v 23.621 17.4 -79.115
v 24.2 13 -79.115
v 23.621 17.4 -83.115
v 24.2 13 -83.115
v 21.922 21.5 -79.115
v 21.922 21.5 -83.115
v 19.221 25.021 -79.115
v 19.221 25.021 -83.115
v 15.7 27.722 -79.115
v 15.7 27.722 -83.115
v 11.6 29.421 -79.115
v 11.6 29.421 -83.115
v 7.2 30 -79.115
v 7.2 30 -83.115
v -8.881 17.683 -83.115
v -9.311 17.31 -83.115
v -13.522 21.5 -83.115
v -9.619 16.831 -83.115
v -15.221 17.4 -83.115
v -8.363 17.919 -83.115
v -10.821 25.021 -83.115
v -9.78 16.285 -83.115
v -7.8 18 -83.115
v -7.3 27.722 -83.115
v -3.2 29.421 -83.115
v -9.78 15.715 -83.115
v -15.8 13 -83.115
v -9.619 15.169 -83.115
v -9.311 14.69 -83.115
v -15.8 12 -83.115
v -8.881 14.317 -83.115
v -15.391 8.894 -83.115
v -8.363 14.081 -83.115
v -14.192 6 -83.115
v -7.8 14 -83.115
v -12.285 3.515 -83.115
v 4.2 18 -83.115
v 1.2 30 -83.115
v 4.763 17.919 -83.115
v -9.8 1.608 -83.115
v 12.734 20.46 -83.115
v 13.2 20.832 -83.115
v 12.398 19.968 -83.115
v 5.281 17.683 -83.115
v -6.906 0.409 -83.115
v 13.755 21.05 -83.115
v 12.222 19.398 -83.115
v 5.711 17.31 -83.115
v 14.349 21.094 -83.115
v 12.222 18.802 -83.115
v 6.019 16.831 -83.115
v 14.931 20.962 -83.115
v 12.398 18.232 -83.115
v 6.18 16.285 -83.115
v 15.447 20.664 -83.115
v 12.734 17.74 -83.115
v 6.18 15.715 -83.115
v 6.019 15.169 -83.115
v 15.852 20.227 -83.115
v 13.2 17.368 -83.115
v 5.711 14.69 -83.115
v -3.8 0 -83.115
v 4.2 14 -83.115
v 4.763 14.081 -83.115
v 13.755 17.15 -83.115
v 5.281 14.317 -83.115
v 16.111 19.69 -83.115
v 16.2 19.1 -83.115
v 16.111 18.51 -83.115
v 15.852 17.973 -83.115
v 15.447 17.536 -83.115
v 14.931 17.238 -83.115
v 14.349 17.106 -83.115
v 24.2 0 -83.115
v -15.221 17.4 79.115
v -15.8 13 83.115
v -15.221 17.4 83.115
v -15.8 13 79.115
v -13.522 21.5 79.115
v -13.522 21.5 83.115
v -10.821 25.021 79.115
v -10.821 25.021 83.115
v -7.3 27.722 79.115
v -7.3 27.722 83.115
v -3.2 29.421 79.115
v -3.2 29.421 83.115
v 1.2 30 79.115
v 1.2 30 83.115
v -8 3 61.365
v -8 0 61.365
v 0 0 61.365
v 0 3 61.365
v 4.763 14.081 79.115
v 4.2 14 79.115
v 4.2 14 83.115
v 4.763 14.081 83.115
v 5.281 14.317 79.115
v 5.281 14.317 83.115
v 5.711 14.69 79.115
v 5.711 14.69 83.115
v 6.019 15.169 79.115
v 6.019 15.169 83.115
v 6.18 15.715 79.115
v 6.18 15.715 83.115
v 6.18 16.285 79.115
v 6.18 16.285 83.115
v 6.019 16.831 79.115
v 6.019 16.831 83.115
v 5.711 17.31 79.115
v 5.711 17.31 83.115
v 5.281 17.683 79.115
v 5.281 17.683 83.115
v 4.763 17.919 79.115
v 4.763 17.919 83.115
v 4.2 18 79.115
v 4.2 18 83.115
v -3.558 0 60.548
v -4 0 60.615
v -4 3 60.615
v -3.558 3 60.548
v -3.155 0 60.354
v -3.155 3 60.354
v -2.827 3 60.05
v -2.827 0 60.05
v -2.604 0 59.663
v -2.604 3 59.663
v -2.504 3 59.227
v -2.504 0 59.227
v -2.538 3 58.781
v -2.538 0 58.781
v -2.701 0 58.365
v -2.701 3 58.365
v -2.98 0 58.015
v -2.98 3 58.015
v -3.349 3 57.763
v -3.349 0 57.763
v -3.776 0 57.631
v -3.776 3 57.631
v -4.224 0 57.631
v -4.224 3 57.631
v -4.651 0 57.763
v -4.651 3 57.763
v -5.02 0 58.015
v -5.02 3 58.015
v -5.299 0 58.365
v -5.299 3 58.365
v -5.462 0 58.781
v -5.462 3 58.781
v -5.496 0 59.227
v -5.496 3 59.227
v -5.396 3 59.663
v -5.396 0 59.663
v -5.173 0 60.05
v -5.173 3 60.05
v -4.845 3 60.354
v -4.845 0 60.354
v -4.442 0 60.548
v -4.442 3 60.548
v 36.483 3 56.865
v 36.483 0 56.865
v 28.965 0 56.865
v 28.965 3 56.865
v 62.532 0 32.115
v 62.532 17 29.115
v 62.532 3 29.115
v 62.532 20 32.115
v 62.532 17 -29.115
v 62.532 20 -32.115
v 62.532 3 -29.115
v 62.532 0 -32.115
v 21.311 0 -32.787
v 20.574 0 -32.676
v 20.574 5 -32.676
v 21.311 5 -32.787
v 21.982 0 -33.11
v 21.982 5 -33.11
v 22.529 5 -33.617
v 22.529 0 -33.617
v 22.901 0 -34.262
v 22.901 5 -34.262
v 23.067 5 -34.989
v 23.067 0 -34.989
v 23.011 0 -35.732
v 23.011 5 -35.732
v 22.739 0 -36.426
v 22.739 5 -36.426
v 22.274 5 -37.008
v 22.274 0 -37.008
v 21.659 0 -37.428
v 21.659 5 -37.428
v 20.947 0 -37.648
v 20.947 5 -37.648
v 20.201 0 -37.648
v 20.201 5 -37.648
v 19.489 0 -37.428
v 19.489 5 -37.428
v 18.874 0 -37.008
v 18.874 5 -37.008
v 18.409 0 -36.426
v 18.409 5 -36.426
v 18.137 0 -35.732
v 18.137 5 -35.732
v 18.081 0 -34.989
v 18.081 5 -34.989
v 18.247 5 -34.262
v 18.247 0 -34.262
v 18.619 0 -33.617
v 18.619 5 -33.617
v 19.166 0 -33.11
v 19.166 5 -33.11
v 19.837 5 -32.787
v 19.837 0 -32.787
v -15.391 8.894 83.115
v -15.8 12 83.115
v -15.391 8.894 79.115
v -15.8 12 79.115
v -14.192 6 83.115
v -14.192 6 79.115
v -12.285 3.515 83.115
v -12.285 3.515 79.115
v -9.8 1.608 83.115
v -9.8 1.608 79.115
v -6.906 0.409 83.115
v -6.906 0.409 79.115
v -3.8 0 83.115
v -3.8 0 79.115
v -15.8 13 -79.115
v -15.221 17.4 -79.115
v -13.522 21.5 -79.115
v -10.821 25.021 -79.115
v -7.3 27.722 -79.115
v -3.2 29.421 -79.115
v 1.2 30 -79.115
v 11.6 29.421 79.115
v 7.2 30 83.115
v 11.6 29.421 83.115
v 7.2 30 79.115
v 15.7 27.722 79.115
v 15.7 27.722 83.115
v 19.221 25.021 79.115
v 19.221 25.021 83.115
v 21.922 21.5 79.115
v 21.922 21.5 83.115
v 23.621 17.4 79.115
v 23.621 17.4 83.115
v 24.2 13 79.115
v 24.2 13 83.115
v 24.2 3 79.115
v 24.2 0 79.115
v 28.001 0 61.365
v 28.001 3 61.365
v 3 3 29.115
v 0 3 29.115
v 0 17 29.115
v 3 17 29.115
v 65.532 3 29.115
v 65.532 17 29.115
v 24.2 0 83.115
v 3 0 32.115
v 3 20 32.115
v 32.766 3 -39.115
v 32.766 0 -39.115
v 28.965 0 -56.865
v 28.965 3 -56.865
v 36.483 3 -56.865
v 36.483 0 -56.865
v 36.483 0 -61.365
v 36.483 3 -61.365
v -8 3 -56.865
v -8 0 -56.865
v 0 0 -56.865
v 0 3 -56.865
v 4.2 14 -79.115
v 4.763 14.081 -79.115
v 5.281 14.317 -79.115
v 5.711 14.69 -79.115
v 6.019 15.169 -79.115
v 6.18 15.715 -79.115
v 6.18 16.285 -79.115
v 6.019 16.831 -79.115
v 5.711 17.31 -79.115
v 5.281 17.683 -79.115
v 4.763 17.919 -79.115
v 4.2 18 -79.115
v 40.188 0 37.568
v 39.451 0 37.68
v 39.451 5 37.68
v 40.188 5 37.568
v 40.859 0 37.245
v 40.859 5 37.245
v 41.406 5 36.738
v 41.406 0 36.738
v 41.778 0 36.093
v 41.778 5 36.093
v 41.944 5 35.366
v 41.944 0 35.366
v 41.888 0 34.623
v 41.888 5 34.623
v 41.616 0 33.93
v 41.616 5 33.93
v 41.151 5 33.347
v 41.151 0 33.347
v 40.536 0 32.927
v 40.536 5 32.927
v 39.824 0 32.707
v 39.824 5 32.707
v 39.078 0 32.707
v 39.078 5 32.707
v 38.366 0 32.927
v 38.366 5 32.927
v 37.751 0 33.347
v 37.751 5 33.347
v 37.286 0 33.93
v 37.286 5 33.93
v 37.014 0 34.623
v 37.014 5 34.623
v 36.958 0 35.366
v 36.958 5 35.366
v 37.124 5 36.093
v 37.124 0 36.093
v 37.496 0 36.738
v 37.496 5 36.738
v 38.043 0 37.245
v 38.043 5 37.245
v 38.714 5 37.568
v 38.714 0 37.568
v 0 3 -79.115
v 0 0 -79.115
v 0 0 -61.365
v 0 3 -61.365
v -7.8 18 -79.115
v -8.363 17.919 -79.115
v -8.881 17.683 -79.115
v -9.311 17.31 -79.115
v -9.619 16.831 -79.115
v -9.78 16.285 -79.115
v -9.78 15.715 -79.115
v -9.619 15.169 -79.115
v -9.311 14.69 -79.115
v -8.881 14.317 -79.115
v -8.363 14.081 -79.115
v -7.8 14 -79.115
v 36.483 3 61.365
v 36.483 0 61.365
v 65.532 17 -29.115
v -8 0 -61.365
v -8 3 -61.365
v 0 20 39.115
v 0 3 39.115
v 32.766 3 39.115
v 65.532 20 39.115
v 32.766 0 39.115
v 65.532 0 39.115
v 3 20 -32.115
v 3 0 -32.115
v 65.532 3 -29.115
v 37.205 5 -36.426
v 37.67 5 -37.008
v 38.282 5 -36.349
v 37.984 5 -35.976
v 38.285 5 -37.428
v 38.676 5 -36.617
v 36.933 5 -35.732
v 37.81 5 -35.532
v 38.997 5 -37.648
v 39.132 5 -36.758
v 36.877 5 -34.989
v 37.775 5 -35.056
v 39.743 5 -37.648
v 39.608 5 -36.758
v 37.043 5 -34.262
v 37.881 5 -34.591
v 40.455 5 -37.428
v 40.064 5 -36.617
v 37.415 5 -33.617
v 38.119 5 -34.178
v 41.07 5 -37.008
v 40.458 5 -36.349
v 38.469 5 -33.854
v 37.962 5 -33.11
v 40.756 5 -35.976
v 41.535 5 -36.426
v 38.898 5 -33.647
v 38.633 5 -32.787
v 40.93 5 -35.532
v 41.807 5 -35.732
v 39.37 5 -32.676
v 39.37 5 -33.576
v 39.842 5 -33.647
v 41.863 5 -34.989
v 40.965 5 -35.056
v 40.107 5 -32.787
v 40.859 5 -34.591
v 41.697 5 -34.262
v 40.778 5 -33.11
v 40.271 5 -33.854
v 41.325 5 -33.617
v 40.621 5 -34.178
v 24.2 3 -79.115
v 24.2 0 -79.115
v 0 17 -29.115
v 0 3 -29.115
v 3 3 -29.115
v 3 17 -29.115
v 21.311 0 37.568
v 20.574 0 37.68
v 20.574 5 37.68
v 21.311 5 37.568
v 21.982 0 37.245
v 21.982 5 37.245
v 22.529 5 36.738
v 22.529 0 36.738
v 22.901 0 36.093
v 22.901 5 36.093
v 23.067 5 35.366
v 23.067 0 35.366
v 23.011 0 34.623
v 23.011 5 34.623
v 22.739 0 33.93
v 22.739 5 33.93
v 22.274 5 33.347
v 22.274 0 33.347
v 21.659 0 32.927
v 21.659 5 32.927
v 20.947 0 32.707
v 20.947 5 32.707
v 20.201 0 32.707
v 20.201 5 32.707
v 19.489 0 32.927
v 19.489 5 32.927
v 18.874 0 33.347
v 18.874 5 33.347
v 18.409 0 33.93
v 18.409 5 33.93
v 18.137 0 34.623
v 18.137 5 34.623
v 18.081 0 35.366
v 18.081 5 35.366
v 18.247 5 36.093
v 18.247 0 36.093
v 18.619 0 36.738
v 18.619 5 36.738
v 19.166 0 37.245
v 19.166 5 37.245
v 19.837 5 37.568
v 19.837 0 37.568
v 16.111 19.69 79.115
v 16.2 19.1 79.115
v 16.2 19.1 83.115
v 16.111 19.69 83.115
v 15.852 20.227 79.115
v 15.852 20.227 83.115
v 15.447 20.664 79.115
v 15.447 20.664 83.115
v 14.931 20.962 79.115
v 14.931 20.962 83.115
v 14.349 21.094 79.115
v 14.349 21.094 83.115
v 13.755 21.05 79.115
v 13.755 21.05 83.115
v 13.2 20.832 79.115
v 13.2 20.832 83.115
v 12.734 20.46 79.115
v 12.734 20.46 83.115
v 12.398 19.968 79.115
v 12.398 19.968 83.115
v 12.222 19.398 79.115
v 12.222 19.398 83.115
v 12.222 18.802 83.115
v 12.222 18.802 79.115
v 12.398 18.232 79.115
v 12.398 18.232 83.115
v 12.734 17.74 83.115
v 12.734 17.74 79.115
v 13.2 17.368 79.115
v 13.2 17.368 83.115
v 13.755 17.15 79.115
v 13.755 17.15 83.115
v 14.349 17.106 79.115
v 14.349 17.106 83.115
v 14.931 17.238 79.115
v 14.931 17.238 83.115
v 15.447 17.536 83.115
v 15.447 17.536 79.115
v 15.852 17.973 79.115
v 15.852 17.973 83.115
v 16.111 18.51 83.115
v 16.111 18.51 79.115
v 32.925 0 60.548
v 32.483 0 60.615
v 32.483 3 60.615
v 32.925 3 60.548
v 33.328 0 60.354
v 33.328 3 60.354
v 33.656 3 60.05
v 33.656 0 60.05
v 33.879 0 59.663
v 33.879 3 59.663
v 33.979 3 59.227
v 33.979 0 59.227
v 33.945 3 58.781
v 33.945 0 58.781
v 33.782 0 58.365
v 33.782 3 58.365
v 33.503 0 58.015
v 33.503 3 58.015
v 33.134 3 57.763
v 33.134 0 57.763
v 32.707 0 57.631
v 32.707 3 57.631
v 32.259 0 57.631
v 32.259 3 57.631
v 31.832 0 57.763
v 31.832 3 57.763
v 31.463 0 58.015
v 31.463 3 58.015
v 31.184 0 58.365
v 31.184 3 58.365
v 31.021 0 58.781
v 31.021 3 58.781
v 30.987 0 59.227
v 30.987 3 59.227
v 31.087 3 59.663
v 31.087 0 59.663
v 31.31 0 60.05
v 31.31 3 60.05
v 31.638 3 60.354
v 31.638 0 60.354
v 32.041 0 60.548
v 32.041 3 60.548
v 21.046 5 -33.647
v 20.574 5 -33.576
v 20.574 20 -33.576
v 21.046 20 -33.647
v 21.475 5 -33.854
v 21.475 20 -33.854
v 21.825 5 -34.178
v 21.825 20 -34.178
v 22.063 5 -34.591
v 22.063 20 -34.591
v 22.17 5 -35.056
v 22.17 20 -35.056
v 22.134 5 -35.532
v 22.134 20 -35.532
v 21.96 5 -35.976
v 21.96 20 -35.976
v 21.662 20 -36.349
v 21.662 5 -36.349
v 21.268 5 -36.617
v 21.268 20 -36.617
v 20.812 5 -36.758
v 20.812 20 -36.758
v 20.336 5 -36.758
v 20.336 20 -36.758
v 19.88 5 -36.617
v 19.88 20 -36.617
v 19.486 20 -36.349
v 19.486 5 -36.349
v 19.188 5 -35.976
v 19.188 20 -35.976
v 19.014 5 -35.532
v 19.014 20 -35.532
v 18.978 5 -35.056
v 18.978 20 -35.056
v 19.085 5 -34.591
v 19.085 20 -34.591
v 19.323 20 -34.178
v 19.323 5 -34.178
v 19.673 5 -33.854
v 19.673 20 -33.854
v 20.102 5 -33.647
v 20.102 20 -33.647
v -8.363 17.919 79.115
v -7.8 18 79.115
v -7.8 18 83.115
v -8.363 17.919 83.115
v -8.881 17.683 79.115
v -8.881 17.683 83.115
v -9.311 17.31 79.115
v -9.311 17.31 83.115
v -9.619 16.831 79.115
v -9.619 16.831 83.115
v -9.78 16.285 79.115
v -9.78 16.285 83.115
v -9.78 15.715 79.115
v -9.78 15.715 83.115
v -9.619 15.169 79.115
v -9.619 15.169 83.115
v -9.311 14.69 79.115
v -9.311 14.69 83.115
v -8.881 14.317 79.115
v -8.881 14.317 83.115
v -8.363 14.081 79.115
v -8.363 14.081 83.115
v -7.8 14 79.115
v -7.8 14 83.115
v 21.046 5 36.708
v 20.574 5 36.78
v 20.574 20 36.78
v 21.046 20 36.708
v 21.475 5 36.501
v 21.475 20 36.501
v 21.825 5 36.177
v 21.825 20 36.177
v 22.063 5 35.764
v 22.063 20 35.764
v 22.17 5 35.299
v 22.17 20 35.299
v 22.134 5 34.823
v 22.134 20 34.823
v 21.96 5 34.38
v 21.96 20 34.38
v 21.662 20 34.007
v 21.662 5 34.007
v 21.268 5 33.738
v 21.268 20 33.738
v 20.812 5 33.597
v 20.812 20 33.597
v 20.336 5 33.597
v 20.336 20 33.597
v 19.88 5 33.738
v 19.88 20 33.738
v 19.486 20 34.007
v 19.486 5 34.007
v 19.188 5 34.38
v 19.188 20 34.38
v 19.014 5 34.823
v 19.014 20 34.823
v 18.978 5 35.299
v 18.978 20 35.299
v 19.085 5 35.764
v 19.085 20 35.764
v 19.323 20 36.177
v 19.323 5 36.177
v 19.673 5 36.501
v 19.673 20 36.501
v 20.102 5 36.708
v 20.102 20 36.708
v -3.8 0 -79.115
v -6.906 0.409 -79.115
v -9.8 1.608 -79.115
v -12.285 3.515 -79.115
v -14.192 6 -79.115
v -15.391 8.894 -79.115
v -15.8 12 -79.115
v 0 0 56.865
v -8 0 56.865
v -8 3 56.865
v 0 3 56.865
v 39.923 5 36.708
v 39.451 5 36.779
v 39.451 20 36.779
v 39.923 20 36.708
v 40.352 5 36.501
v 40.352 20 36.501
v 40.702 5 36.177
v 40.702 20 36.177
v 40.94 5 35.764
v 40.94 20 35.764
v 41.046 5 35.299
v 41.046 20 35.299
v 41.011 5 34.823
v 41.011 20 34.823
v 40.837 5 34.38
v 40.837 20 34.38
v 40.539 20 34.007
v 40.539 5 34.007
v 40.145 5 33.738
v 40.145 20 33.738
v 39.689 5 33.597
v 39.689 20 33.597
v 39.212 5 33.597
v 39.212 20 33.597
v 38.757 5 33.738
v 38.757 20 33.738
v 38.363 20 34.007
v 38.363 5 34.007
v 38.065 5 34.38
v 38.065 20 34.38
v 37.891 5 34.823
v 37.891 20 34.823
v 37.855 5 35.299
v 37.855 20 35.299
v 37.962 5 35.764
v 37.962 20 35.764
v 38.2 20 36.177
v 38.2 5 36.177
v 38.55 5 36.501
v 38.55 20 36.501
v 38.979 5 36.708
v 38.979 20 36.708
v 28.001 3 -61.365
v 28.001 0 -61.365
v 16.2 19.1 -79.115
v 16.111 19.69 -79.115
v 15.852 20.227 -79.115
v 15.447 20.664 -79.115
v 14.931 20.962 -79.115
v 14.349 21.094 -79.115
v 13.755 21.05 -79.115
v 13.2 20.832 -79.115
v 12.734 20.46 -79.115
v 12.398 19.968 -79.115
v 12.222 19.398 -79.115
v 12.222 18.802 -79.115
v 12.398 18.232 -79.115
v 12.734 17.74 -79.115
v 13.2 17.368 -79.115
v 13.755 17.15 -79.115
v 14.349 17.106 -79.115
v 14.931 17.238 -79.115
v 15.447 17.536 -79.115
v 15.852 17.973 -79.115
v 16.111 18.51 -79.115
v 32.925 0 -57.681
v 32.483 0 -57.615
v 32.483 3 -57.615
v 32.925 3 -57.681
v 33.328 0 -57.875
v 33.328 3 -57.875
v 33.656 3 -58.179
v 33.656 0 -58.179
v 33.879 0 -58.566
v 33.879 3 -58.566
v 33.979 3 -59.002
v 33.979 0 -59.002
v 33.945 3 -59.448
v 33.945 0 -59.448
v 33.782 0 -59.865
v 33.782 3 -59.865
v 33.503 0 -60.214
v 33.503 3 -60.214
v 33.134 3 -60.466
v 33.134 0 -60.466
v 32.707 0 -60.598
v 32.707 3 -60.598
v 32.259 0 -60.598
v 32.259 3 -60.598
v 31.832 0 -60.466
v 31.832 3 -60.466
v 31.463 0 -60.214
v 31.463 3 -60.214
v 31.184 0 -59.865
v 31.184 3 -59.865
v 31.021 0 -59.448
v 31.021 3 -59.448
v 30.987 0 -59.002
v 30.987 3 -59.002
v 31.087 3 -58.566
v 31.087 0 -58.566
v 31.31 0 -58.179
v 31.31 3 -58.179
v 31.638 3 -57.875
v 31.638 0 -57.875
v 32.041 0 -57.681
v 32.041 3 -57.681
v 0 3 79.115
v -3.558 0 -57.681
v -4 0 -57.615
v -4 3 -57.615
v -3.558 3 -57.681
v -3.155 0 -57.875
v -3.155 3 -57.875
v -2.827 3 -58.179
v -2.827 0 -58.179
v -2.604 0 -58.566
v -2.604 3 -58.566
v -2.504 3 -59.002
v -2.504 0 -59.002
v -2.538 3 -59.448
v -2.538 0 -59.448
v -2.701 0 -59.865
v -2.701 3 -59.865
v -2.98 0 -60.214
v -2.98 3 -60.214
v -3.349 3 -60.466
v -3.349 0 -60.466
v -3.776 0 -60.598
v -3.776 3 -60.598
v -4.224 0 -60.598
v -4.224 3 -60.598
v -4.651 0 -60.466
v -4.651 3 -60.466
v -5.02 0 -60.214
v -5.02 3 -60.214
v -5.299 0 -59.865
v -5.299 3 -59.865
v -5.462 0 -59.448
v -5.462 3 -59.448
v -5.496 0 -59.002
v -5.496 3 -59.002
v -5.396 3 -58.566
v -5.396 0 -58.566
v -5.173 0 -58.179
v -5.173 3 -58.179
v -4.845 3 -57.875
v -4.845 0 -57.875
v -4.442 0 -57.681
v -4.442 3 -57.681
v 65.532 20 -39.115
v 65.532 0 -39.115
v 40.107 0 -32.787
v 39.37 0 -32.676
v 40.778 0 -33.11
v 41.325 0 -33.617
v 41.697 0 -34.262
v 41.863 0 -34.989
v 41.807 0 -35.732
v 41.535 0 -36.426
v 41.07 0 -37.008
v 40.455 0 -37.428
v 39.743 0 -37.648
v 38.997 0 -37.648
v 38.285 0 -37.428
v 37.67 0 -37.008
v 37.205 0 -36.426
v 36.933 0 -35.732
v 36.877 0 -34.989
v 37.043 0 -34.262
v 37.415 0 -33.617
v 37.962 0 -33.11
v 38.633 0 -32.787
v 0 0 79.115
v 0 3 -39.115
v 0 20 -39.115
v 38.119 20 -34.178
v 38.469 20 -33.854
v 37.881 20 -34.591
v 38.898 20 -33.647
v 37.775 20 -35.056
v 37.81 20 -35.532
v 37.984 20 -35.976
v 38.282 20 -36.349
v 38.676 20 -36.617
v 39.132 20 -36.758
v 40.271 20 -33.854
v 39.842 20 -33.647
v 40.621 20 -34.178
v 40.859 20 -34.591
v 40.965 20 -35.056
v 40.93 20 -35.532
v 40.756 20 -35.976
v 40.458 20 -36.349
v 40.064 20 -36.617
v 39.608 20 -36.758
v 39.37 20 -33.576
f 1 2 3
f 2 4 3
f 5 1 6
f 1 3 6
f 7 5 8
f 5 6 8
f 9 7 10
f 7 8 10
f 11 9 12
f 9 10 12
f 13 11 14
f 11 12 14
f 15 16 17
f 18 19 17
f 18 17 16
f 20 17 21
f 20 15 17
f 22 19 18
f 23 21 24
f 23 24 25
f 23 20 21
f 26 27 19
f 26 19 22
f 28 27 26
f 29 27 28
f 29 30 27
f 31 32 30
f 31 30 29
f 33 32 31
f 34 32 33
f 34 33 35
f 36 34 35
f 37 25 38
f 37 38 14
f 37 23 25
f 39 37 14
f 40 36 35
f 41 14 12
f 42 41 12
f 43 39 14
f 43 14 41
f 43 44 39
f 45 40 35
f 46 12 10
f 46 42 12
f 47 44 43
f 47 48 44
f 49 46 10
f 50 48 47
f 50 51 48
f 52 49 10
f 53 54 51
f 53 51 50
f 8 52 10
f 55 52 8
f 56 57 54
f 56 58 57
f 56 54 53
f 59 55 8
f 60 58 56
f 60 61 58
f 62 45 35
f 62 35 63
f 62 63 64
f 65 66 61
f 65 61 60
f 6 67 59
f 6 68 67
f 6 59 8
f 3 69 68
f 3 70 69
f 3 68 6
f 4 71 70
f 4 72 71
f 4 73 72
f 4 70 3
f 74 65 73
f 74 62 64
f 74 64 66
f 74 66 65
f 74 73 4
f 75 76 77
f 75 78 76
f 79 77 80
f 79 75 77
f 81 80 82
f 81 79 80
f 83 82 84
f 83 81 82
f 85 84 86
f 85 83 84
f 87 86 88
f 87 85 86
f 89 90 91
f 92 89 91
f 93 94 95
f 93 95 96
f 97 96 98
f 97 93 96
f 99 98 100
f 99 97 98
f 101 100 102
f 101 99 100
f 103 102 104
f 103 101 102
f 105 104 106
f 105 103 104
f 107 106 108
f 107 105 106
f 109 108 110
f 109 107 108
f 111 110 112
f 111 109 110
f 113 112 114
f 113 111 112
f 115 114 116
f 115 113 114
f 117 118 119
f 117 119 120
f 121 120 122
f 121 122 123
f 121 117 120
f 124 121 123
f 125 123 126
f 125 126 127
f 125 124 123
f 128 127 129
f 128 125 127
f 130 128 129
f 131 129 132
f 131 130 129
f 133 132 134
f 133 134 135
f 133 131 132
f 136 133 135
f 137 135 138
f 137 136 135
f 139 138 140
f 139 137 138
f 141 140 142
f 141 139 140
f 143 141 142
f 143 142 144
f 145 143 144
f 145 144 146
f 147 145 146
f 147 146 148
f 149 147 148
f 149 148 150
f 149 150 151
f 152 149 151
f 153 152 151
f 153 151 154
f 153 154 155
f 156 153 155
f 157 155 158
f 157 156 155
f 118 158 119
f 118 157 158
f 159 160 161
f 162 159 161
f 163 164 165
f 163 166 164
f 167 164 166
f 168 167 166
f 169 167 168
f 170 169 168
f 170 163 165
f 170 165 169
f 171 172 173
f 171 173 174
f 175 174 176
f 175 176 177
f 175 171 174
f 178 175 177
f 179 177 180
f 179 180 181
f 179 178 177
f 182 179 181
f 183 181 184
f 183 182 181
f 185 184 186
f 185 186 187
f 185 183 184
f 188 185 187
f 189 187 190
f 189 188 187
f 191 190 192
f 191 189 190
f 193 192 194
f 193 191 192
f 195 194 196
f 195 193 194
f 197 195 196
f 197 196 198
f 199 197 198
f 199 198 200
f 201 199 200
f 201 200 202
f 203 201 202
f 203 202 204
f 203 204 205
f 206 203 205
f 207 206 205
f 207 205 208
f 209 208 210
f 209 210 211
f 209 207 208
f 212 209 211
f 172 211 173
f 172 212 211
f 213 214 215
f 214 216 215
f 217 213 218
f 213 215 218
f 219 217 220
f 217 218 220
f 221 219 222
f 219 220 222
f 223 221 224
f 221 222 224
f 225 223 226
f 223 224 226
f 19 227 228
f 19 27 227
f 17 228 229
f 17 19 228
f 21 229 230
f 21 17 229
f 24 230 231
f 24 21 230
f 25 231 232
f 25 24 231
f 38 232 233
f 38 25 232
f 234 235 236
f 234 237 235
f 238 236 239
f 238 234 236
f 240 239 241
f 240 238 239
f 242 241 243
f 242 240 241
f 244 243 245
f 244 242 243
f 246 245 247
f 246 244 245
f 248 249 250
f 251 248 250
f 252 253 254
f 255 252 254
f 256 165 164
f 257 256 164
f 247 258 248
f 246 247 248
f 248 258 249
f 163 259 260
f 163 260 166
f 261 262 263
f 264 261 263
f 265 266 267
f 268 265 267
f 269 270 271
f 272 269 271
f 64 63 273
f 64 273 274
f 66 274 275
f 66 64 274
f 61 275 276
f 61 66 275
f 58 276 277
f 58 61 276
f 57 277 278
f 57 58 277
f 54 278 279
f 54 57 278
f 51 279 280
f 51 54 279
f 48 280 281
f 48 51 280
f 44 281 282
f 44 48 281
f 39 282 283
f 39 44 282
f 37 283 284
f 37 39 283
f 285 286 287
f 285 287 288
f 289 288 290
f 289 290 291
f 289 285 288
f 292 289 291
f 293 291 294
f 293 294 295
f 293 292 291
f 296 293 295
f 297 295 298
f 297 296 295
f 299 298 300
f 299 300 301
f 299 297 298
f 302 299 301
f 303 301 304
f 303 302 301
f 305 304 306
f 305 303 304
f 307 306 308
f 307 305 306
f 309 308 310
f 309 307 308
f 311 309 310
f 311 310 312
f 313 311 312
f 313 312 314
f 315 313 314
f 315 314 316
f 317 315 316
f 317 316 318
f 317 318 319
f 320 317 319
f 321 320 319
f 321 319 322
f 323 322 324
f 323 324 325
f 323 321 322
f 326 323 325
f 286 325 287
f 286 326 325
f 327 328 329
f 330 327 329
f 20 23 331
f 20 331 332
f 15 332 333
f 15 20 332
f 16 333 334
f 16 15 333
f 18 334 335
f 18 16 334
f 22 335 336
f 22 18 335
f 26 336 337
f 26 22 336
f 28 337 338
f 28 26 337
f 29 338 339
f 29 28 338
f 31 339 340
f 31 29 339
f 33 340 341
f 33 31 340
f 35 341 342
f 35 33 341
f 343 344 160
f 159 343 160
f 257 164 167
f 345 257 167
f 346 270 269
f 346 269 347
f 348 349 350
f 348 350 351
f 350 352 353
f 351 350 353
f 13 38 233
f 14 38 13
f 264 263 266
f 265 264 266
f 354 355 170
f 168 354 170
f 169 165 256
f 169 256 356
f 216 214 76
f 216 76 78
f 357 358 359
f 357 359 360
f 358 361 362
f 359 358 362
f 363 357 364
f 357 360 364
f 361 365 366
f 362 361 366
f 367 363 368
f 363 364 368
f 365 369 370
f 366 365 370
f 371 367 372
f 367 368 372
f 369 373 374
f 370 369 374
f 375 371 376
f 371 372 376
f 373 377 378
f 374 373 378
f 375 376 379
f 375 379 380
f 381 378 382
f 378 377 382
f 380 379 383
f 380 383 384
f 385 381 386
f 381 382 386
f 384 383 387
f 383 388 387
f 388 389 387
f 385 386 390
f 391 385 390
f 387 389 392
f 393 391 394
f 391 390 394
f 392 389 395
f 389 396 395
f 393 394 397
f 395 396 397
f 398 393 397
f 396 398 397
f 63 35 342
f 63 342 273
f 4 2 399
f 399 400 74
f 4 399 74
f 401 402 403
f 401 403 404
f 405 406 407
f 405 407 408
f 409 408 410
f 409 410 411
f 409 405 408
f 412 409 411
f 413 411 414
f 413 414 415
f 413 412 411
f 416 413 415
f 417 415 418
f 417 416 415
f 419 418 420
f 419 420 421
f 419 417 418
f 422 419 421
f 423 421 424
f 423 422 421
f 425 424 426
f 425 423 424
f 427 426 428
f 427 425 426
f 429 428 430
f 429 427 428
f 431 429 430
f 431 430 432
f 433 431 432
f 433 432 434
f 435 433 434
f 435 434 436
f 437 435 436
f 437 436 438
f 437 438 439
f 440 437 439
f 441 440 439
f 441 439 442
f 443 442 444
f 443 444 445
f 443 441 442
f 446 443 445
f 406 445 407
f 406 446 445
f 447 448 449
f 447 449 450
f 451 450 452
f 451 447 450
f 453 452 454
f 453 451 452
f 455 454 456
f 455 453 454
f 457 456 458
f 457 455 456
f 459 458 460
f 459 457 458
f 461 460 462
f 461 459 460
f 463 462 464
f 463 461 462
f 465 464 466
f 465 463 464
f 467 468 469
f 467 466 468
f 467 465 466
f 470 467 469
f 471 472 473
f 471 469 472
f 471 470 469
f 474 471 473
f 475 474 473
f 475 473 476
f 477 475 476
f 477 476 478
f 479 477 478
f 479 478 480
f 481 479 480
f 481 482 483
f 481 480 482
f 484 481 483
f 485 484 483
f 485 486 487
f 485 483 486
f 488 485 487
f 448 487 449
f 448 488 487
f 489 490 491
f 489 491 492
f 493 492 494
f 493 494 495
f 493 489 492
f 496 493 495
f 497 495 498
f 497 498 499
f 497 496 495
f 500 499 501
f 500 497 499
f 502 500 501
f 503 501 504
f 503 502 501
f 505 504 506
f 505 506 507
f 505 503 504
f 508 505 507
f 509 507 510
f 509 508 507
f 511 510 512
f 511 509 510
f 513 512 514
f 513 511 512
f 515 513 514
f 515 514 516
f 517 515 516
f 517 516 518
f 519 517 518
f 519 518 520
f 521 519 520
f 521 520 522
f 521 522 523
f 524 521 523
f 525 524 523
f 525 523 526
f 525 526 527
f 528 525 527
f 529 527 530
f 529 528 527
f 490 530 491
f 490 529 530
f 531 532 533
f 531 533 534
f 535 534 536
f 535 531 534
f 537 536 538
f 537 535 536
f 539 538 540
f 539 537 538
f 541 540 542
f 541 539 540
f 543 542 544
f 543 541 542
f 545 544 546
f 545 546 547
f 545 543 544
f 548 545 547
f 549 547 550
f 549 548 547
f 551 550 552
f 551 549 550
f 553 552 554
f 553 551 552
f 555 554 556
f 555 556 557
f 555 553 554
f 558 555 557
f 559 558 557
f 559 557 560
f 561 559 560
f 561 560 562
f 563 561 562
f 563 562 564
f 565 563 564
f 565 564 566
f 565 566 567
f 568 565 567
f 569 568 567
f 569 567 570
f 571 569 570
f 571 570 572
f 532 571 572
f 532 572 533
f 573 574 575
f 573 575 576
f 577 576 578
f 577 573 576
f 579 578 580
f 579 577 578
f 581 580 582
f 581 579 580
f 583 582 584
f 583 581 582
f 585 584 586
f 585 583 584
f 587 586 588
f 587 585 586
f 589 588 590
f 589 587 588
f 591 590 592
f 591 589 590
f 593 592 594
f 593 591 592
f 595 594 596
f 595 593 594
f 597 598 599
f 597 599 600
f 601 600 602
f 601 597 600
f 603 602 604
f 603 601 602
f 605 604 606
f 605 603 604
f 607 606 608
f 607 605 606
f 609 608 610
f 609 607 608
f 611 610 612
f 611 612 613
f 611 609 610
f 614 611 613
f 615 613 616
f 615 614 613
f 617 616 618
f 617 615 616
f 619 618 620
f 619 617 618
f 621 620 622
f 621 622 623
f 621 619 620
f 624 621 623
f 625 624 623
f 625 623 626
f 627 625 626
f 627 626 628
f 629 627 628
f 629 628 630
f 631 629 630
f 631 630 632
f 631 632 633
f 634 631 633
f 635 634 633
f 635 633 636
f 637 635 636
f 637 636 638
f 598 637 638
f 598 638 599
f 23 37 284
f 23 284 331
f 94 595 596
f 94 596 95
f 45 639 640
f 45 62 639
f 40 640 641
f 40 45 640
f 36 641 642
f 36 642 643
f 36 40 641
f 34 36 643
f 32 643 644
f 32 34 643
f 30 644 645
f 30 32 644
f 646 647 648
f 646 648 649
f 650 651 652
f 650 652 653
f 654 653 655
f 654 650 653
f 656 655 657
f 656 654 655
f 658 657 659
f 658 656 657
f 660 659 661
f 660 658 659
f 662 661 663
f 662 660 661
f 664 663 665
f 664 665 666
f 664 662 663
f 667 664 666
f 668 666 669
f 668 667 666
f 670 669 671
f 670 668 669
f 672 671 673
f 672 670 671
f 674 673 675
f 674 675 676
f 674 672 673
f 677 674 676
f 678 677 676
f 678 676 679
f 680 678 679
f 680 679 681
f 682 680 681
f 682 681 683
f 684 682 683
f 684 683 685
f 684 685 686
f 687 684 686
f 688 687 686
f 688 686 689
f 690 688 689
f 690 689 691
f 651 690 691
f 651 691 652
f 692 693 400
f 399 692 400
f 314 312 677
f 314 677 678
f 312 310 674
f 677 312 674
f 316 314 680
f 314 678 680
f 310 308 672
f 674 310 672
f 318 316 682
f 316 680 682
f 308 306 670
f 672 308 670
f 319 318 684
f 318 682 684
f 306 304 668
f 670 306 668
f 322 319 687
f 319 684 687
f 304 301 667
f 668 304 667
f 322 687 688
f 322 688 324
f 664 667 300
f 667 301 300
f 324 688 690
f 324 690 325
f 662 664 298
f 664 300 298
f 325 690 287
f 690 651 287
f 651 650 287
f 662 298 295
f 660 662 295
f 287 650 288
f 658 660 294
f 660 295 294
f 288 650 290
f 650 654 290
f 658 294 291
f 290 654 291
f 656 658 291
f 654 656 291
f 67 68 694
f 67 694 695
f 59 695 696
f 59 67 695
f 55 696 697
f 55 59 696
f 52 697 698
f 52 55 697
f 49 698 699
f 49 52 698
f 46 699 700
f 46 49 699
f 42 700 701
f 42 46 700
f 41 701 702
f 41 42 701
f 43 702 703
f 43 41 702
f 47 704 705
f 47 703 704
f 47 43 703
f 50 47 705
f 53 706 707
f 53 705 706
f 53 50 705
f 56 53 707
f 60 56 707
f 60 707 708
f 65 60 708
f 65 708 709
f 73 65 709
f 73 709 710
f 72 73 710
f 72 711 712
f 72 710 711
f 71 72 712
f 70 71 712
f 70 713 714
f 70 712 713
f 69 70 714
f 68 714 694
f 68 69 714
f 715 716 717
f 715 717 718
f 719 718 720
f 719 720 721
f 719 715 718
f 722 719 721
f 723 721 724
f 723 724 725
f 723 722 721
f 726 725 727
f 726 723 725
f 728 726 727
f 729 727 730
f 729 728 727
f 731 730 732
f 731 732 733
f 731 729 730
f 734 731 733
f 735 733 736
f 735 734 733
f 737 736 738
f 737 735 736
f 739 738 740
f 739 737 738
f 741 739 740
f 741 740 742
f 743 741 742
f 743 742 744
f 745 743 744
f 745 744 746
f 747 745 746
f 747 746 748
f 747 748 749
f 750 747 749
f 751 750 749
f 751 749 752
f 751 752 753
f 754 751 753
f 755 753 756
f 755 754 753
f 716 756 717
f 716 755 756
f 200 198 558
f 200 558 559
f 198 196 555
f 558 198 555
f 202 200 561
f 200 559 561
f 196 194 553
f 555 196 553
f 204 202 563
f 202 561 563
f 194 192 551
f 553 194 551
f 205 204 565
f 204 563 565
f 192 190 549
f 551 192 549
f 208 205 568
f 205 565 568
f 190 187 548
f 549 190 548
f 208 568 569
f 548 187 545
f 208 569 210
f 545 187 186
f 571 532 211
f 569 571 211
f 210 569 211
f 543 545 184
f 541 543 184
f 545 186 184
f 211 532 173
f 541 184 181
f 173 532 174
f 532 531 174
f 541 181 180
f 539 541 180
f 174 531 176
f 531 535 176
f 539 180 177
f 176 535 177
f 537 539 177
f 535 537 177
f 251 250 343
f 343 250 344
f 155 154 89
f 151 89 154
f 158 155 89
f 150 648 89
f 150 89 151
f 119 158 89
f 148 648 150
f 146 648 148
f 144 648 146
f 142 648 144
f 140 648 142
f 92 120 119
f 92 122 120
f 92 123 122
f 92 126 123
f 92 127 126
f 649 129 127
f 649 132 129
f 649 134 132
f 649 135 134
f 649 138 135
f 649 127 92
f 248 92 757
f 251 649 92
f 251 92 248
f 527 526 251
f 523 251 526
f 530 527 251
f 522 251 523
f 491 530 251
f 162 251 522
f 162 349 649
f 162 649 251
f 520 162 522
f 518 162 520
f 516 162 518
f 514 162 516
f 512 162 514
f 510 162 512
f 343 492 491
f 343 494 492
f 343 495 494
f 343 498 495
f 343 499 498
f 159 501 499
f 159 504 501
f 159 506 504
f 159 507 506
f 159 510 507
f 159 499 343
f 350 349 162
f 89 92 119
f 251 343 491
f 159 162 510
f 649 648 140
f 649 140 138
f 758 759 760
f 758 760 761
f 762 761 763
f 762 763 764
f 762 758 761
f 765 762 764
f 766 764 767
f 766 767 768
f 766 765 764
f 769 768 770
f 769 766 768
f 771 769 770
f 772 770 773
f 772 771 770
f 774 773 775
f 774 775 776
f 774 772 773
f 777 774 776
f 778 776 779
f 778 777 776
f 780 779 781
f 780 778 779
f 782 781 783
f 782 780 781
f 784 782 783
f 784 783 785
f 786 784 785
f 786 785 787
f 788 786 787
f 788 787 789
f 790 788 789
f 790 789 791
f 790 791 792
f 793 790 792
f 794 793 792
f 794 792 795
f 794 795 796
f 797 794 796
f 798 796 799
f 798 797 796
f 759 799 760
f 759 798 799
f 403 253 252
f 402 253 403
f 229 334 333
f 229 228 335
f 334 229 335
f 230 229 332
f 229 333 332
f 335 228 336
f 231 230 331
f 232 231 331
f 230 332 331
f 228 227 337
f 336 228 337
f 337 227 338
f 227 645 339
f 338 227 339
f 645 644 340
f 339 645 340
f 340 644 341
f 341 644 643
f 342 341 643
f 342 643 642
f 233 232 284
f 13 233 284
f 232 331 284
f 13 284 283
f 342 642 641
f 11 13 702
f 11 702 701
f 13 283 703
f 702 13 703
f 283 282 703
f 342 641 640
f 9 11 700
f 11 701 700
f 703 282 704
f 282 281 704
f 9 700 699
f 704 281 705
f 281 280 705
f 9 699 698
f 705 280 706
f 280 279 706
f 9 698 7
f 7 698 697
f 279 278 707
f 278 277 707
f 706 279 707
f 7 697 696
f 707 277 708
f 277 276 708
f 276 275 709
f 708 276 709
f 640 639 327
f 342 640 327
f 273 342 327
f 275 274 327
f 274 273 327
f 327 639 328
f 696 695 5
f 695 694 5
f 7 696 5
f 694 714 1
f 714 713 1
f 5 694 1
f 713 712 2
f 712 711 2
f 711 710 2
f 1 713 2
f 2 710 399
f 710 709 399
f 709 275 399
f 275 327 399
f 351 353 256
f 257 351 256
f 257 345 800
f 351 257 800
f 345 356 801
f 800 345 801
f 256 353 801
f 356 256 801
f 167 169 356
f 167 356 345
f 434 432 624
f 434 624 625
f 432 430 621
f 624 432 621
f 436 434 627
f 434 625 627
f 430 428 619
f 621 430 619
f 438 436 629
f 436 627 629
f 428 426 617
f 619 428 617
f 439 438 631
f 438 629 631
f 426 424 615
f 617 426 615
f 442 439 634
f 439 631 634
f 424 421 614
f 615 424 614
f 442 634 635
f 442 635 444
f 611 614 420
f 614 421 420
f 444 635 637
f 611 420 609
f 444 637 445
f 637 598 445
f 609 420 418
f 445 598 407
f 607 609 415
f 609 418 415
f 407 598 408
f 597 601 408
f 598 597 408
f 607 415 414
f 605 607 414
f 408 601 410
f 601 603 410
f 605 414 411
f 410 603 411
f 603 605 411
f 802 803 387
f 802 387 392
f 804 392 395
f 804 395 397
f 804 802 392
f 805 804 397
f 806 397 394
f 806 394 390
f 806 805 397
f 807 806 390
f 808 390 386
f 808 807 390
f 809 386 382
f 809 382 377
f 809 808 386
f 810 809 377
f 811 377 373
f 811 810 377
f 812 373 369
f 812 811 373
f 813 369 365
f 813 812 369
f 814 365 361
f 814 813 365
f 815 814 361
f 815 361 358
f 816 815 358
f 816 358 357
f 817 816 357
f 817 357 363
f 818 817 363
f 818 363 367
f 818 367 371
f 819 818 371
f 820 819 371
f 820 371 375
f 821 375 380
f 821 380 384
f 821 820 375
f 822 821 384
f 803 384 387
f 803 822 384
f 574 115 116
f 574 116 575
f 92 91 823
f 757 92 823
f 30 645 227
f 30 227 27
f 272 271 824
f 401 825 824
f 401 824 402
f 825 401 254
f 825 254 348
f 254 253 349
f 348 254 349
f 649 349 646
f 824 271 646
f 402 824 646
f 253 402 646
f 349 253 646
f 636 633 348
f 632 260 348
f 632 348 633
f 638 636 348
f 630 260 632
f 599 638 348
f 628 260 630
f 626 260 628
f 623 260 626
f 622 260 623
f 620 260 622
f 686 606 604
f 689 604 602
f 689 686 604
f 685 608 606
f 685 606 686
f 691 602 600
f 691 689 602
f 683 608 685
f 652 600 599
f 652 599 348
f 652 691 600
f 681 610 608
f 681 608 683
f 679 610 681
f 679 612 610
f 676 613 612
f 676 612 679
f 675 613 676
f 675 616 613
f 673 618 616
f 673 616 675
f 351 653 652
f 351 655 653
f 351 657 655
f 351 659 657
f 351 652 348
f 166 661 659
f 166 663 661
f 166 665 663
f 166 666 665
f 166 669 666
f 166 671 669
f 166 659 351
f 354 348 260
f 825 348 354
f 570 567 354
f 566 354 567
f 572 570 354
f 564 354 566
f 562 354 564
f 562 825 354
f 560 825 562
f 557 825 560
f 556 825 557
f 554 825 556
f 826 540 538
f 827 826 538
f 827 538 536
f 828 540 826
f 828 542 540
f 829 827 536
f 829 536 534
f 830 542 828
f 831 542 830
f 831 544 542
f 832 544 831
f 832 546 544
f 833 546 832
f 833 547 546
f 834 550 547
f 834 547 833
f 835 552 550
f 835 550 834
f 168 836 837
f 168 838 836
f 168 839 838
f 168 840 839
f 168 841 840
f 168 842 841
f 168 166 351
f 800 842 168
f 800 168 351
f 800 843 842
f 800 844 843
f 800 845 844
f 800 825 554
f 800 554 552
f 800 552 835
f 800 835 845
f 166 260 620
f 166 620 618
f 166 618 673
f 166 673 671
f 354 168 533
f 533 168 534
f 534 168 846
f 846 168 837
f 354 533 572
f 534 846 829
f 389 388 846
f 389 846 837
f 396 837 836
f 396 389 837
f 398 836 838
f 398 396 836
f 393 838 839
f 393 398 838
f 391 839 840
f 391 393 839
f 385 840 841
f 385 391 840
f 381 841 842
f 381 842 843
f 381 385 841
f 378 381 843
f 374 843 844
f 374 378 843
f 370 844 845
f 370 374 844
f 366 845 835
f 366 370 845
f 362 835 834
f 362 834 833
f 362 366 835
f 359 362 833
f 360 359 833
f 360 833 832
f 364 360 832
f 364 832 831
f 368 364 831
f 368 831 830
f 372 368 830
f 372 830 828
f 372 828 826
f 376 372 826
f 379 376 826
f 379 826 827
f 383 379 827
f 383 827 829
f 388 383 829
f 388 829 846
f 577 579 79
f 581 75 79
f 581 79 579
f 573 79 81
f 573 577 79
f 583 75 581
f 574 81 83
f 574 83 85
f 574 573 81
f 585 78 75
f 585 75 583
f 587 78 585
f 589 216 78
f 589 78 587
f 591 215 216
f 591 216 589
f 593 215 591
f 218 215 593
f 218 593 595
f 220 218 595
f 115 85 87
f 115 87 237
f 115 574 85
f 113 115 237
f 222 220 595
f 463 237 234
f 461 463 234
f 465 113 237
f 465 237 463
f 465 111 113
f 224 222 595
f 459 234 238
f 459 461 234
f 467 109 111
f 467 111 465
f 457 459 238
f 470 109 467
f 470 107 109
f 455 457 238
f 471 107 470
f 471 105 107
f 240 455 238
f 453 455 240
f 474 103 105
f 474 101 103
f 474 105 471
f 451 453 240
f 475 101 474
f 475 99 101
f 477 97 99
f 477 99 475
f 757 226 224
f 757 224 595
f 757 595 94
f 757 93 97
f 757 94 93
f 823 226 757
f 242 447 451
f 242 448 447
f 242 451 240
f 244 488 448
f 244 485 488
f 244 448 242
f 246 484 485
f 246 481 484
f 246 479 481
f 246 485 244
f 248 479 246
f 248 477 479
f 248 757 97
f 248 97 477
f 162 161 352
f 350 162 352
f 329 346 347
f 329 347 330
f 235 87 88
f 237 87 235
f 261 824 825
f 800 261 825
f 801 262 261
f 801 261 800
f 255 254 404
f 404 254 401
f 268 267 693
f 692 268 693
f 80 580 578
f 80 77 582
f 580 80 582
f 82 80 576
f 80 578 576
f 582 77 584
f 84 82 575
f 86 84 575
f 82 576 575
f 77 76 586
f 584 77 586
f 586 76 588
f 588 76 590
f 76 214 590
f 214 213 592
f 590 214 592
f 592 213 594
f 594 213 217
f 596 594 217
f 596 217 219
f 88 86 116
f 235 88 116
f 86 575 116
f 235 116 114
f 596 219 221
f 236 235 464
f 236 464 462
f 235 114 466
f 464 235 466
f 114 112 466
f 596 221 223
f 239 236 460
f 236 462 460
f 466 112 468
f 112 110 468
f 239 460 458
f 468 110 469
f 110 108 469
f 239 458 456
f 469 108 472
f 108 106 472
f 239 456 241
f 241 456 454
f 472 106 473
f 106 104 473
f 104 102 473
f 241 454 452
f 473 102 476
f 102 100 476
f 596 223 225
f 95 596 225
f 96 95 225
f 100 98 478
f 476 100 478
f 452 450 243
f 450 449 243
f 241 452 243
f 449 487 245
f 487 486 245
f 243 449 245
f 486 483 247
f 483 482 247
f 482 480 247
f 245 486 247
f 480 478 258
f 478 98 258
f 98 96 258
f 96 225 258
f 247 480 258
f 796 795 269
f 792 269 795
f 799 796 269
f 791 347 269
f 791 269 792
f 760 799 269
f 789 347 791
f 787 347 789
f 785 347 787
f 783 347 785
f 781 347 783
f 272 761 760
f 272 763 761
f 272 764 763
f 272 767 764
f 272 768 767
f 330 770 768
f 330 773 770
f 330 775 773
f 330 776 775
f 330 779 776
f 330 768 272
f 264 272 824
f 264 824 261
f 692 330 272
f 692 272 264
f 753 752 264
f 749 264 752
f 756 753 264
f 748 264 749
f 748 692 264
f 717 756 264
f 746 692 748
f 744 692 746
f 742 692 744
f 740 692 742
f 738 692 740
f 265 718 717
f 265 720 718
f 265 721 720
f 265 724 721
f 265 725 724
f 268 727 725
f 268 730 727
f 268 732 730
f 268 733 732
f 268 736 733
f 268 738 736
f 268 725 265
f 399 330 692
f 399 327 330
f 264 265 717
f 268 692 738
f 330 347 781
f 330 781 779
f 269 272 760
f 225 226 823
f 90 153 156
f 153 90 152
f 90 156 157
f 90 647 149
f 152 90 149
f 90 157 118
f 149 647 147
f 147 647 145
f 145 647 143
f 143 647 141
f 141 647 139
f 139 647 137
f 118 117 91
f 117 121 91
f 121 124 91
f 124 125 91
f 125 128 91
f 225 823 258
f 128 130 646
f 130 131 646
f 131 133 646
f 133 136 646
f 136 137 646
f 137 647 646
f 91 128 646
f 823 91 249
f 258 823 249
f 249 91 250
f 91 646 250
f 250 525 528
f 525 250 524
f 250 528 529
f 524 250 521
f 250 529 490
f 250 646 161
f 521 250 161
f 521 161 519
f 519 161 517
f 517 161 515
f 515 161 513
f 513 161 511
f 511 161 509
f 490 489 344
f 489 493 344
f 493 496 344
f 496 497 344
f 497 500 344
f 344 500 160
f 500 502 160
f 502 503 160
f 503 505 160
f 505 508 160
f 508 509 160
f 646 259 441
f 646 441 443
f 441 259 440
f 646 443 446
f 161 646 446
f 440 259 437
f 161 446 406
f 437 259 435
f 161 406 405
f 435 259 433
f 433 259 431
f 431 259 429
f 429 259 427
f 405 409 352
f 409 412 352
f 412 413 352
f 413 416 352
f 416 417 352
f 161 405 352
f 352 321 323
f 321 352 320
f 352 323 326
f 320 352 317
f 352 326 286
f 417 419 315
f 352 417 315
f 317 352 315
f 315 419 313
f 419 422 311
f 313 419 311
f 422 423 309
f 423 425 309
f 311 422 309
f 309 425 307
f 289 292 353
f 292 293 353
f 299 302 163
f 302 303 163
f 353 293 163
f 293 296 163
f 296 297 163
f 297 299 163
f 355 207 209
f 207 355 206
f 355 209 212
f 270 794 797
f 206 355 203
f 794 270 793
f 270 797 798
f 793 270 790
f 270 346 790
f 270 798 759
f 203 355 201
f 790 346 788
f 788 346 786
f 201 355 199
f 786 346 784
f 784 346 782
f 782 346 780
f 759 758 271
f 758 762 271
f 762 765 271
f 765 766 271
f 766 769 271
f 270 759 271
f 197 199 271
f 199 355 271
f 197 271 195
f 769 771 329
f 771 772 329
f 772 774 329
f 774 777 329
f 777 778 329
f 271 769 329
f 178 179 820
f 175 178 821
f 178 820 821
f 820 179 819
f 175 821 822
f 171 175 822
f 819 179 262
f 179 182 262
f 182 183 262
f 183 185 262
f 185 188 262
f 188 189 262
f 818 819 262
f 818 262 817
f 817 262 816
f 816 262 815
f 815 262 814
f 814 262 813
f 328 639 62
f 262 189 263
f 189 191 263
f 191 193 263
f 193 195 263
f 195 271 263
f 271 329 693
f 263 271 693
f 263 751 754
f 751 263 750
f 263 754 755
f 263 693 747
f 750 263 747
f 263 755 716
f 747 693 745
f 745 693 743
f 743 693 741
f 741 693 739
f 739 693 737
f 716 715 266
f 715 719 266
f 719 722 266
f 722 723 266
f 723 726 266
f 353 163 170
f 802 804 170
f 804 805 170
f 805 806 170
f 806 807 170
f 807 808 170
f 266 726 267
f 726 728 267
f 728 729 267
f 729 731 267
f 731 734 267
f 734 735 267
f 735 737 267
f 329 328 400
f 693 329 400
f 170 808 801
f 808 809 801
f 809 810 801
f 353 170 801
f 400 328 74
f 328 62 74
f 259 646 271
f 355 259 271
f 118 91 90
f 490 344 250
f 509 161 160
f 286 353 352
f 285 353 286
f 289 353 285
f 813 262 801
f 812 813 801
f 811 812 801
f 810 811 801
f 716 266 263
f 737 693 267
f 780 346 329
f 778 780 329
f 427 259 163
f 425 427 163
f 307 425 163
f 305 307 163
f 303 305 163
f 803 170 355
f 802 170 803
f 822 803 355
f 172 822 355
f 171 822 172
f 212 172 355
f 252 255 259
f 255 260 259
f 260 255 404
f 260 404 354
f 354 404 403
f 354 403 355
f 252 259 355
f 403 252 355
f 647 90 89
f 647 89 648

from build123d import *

# Parameters (mm, degrees)
SKETCH1_R               = 1.6
SKETCH1_R_2             = 1.599939077
SKETCH1_W               = 59.532
SKETCH1_H               = 64.229021166
SKETCH1_R_3             = 1.599995589
SKETCH1_R_4             = 1.5
BOSS_EXTRUDE1_DEPTH     = 3
SKETCH2_W               = 40
SKETCH2_H               = 4
BOSS_EXTRUDE2_DEPTH     = 30
CUT_EXTRUDE1_DEPTH      = 111.01120349
CUT_EXTRUDE1_DEPTH_BACK = 111.01120349
SKETCH3_R               = 2
FILLET2_R               = 17
FILLET3_R               = 12
SKETCH1_8_R             = 1.6
SKETCH1_8_R_2           = 1.599939077
SKETCH1_8_W             = 59.532
SKETCH1_8_H             = 64.229021166
SKETCH1_8_R_3           = 1.599995589
BOSS_EXTRUDE3_DEPTH     = 20
SKETCH5_R               = 2.5
CUT_EXTRUDE2_DEPTH      = 5
SKETCH7_W               = 58.229021166
SKETCH7_H               = 14
CUT_EXTRUDE3_DEPTH      = 111.01120349


with BuildPart() as part:
    # Sketch1 → Boss-Extrude1 (new body)
    with BuildSketch(Plane(origin=(0, 0, 0), x_dir=(1, 0, 0), z_dir=(0, 1, 0))):
        Polygon((65.532, 39.114510583), (32.766, 39.114510583), (28.9648375, 56.864510583), (36.483, 56.864510583), (36.483, 61.364510583), (28.0011625, 61.364510583), (24.2, 79.114510583), (0, 79.114510583), (0, 61.364510583), (-8, 61.364510583), (-8, 56.864510583), (0, 56.864510583), (0, -56.864510583), (-8, -56.864510583), (-8, -61.364510583), (0, -61.364510583), (0, -79.114510583), (24.2, -79.114510583), (28.0011625, -61.364510583), (36.483, -61.364510583), (36.483, -56.864510583), (28.9648375, -56.864510583), (32.766, -39.114510583), (65.532, -39.114510583), align=None)
        with Locations((20.574, -35.179510583)):
            Circle(SKETCH1_R, mode=Mode.SUBTRACT)
        with Locations((39.450944, -35.179510583)):
            Circle(SKETCH1_R_2, mode=Mode.SUBTRACT)
        with Locations((32.766, 0)):
            Rectangle(SKETCH1_W, SKETCH1_H, mode=Mode.SUBTRACT)
        with Locations((20.574, 35.1758104)):
            Circle(SKETCH1_R_3, mode=Mode.SUBTRACT)
        with Locations((39.37, 35.1758104)):
            Circle(SKETCH1_R_2, mode=Mode.SUBTRACT)
        with Locations((-4, 59.114510583)):
            Circle(SKETCH1_R_4, mode=Mode.SUBTRACT)
        with Locations((32.483, 59.114510583)):
            Circle(SKETCH1_R_4, mode=Mode.SUBTRACT)
        with Locations((32.483, -59.114510583)):
            Circle(SKETCH1_R_4, mode=Mode.SUBTRACT)
        with Locations((-4, -59.114510583)):
            Circle(SKETCH1_R_4, mode=Mode.SUBTRACT)
    extrude(amount=BOSS_EXTRUDE1_DEPTH)

    # Sketch2 → Boss-Extrude2 (add)
    with BuildSketch(Plane(origin=(0, 0, 0), x_dir=(1, 0, 0), z_dir=(0, 1, 0))):
        with Locations((4.2, -81.114510583)):
            Rectangle(SKETCH2_W, SKETCH2_H)
        with Locations((4.2, 81.114510583)):
            Rectangle(SKETCH2_W, SKETCH2_H)
    extrude(amount=BOSS_EXTRUDE2_DEPTH)

    # Sketch3 → Cut-Extrude1 (cut, two sides: drawn at the far end of the back side and taken through both)
    with BuildSketch(Plane.XY.offset(-CUT_EXTRUDE1_DEPTH_BACK)):
        with BuildLine():
            Line((4.2, 18), (-7.8, 18))
            ThreePointArc((-7.8, 18), (-9.8, 16), (-7.8, 14))
            Line((-7.8, 14), (4.2, 14))
            ThreePointArc((4.2, 14), (6.2, 16), (4.2, 18))
        make_face()
        with Locations((14.2, 19.1)):
            Circle(SKETCH3_R)
    extrude(amount=CUT_EXTRUDE1_DEPTH + CUT_EXTRUDE1_DEPTH_BACK, mode=Mode.SUBTRACT)

    # Fillet2
    fillet2_edges = [part.edges().sort_by_distance(p)[0] for p in [
        (-15.8, 30, -81.114510583),
        (24.2, 30, -81.114510583),
        (24.2, 30, 81.114510583),
        (-15.8, 30, 81.114510583),
    ]]
    fillet(fillet2_edges, radius=FILLET2_R)

    # Fillet3
    fillet3_edges = [part.edges().sort_by_distance(p)[0] for p in [
        (-15.8, 0, 81.114510583),
        (-15.8, 0, -81.114510583),
    ]]
    fillet(fillet3_edges, radius=FILLET3_R)

    # Sketch1<8> → Boss-Extrude3 (add)
    with BuildSketch(Plane(origin=(0, 0, 0), x_dir=(1, 0, 0), z_dir=(0, 1, 0))):
        Polygon((32.766, 39.114510583), (0, 39.114510583), (0, -39.114510583), (32.766, -39.114510583), (65.532, -39.114510583), (65.532, 39.114510583), align=None)
        with Locations((20.574, -35.179510583)):
            Circle(SKETCH1_8_R, mode=Mode.SUBTRACT)
        with Locations((39.450944, -35.179510583)):
            Circle(SKETCH1_8_R_2, mode=Mode.SUBTRACT)
        with Locations((32.766, 0)):
            Rectangle(SKETCH1_8_W, SKETCH1_8_H, mode=Mode.SUBTRACT)
        with Locations((20.574, 35.1758104)):
            Circle(SKETCH1_8_R_3, mode=Mode.SUBTRACT)
        with Locations((39.37, 35.1758104)):
            Circle(SKETCH1_8_R_2, mode=Mode.SUBTRACT)
    extrude(amount=BOSS_EXTRUDE3_DEPTH)

    # Sketch5 → Cut-Extrude2 (cut)
    with BuildSketch(Plane(origin=(0, 0, 0), x_dir=(1, 0, 0), z_dir=(0, 1, 0))):
        with Locations((20.574, -35.179510583)):
            Circle(SKETCH5_R)
        with Locations((39.450944, -35.179510583)):
            Circle(SKETCH5_R)
        with Locations((20.574, 35.1758104)):
            Circle(SKETCH5_R)
        with Locations((39.37, 35.1758104)):
            Circle(SKETCH5_R)
    extrude(amount=CUT_EXTRUDE2_DEPTH, mode=Mode.SUBTRACT)

    # Sketch7 → Cut-Extrude3 (cut, through all)
    with BuildSketch(Plane(origin=(0, 0, 0), x_dir=(0, 0, -1), z_dir=(1, 0, 0))):
        with Locations((0, 10)):
            Rectangle(SKETCH7_W, SKETCH7_H)
    extrude(amount=CUT_EXTRUDE3_DEPTH, mode=Mode.SUBTRACT)


solid = part.part
